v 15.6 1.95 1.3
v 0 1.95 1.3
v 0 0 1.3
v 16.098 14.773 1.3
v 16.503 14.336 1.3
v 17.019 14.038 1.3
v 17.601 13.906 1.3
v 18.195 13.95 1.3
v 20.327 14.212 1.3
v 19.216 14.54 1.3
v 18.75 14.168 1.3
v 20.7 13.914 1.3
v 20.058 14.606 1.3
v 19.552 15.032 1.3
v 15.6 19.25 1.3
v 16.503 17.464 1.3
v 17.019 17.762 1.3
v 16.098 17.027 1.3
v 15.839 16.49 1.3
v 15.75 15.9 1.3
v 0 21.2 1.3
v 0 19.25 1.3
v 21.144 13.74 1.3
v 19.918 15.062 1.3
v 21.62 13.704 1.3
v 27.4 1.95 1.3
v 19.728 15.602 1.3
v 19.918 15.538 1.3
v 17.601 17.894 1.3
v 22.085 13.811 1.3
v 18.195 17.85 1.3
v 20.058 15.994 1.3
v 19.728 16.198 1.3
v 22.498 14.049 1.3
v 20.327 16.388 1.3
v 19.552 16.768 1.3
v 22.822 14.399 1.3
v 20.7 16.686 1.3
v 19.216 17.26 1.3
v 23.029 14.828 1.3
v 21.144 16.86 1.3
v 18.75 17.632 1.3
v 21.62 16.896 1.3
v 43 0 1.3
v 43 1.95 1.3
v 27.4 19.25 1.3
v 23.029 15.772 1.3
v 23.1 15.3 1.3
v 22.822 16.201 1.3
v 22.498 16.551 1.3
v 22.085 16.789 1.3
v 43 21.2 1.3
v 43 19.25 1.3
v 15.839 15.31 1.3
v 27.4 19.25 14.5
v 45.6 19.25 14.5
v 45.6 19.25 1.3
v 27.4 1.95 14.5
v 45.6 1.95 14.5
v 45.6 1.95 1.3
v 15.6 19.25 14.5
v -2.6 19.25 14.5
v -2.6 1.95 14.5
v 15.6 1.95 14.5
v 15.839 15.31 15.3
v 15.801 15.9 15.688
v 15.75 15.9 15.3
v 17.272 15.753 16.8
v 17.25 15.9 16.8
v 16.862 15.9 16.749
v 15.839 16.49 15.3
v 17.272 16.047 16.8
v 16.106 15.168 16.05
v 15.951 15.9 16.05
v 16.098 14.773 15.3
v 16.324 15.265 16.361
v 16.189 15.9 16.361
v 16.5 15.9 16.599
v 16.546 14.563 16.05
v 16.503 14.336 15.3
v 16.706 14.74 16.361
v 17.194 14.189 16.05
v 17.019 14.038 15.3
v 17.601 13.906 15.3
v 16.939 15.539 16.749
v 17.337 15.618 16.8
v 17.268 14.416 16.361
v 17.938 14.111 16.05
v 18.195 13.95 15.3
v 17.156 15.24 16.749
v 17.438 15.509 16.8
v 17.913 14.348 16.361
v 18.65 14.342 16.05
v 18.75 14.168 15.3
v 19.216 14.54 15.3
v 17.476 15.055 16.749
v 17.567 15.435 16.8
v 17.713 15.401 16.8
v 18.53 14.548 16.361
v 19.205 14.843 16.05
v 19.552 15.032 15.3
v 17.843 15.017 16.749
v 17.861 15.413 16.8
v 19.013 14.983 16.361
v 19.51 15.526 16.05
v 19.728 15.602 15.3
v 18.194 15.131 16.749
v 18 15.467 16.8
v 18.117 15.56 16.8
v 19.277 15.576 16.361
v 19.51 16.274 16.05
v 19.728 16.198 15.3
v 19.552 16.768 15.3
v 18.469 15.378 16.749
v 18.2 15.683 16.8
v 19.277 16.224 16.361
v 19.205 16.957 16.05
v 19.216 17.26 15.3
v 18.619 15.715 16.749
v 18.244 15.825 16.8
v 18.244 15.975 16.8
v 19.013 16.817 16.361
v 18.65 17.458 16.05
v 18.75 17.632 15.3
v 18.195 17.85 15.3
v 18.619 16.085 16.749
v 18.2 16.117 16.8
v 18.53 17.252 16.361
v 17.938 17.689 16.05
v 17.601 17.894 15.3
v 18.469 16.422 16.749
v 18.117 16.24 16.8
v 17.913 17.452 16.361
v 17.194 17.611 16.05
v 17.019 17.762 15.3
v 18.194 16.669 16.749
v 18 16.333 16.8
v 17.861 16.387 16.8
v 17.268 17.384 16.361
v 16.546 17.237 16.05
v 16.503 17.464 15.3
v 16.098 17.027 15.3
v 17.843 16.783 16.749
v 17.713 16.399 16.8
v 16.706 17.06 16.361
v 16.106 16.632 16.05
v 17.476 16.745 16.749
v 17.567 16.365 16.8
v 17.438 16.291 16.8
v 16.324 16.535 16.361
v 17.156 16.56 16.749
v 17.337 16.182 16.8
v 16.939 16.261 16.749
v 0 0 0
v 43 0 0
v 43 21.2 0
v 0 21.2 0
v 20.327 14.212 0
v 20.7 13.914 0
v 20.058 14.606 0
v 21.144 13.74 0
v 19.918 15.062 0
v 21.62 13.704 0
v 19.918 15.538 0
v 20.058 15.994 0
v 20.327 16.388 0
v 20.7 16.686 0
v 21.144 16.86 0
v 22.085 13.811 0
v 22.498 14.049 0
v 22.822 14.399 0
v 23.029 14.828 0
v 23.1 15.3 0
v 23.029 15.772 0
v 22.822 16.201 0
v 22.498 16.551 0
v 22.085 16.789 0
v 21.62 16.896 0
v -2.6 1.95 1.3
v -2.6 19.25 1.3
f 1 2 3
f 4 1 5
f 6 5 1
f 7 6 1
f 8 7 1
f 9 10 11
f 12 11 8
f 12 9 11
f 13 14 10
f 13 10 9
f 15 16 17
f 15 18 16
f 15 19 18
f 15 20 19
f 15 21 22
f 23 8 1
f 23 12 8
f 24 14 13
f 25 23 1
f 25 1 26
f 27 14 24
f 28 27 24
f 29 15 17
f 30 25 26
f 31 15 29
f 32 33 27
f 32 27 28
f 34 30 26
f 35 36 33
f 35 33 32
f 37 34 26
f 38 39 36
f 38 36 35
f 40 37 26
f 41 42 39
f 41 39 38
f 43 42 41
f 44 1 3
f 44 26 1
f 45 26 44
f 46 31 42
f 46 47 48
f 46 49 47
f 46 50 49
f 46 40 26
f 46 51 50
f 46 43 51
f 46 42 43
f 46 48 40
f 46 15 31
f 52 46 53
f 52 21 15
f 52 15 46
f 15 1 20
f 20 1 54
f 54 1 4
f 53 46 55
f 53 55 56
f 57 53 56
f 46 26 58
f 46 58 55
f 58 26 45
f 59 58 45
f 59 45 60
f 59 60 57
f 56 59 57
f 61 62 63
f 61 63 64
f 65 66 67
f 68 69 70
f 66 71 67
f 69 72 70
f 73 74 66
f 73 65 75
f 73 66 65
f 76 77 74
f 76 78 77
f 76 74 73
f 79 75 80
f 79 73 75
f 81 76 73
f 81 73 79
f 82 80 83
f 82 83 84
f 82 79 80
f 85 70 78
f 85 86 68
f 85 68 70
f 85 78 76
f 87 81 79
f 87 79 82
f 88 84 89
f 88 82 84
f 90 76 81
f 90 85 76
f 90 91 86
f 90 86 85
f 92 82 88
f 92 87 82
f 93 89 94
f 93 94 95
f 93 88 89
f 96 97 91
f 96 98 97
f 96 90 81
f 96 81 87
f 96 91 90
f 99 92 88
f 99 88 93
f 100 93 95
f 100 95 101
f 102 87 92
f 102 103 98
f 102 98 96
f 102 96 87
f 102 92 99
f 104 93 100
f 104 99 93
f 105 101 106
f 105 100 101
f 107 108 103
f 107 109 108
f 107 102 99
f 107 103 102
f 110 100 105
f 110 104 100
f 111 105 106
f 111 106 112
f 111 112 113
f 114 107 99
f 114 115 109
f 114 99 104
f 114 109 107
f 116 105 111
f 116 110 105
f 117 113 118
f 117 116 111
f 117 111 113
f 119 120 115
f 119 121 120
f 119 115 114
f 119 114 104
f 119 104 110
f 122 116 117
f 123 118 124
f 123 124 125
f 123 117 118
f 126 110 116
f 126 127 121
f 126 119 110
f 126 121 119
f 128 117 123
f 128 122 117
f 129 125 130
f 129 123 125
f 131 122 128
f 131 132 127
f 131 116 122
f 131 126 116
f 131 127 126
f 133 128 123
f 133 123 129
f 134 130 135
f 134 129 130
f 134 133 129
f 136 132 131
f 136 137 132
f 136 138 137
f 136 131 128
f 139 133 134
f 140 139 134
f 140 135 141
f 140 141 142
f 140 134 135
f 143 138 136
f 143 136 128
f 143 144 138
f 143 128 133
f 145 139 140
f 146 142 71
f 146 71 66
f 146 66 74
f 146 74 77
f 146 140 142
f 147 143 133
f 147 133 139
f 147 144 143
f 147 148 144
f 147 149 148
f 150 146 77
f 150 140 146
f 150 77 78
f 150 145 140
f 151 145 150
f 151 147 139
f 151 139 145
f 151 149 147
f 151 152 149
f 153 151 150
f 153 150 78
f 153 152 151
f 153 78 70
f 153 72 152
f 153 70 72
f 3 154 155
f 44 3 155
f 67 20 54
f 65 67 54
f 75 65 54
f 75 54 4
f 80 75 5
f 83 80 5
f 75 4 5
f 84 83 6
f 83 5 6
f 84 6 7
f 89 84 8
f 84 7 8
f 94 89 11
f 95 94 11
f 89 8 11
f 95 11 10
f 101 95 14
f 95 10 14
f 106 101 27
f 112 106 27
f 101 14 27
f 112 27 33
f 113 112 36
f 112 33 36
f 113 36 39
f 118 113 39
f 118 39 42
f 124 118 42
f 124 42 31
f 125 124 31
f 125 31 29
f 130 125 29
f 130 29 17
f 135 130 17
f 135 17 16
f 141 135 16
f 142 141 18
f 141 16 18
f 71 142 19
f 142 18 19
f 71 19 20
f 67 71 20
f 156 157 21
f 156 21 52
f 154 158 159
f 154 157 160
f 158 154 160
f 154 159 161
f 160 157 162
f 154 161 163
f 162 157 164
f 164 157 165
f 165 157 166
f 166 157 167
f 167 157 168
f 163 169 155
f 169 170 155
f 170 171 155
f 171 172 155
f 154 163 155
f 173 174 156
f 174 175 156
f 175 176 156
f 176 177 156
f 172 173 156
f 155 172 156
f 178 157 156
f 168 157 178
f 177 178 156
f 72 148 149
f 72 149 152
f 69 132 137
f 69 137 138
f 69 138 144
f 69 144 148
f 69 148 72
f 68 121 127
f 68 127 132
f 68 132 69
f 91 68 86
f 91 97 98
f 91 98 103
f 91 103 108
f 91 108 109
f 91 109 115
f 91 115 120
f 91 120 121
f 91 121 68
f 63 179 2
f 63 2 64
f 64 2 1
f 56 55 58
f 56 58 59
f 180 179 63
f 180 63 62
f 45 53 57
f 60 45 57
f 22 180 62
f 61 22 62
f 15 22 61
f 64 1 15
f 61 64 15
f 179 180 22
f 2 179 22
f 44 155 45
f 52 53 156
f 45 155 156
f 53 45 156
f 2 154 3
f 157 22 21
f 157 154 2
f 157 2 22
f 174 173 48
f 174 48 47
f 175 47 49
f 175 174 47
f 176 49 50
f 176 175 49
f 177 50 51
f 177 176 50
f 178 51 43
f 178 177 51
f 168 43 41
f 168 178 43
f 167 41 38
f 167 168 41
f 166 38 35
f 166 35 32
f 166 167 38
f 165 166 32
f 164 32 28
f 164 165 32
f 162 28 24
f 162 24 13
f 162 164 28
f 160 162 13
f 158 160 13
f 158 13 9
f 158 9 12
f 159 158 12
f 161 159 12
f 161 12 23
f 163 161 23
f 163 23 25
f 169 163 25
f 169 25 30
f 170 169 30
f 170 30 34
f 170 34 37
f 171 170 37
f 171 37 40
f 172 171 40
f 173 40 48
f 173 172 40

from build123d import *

# Parameters (mm, degrees)
SKETCH1_W           = 43
SKETCH1_H           = 21.2
SKETCH1_R           = 1.6
BOSS_EXTRUDE1_DEPTH = 1.3
SKETCH2_R           = 2
BOSS_EXTRUDE2_DEPTH = 15.5
FILLET1_R           = 1.5
SKETCH3_W           = 18.2
SKETCH3_H           = 17.3
BOSS_EXTRUDE3_DEPTH = 13.2


with BuildPart() as part:
    # Sketch1 → Boss-Extrude1 (new body)
    with BuildSketch(Plane.XY):
        with Locations((21.5, 10.6)):
            Rectangle(SKETCH1_W, SKETCH1_H)
        with Locations((21.5, 15.3)):
            Circle(SKETCH1_R, mode=Mode.SUBTRACT)
    extrude(amount=BOSS_EXTRUDE1_DEPTH)

    # Sketch2 → Boss-Extrude2 (add)
    with BuildSketch(Plane.XY.offset(1.3)):
        with Locations(Location((17.75, 15.9, 0), (0, 0, 180))):
            Circle(SKETCH2_R)
    extrude(amount=BOSS_EXTRUDE2_DEPTH)

    # Fillet1
    fillet1_edges = [part.edges().sort_by_distance(p)[0] for p in [
        (19.75, 15.9, 16.8),
    ]]
    fillet(fillet1_edges, radius=FILLET1_R)

    # Sketch3 → Boss-Extrude3 (add)
    with BuildSketch(Plane.XY.offset(1.3)):
        with Locations((36.5, 10.6)):
            Rectangle(SKETCH3_W, SKETCH3_H)
        with Locations((6.5, 10.6)):
            Rectangle(SKETCH3_W, SKETCH3_H)
    extrude(amount=BOSS_EXTRUDE3_DEPTH)


solid = part.part
